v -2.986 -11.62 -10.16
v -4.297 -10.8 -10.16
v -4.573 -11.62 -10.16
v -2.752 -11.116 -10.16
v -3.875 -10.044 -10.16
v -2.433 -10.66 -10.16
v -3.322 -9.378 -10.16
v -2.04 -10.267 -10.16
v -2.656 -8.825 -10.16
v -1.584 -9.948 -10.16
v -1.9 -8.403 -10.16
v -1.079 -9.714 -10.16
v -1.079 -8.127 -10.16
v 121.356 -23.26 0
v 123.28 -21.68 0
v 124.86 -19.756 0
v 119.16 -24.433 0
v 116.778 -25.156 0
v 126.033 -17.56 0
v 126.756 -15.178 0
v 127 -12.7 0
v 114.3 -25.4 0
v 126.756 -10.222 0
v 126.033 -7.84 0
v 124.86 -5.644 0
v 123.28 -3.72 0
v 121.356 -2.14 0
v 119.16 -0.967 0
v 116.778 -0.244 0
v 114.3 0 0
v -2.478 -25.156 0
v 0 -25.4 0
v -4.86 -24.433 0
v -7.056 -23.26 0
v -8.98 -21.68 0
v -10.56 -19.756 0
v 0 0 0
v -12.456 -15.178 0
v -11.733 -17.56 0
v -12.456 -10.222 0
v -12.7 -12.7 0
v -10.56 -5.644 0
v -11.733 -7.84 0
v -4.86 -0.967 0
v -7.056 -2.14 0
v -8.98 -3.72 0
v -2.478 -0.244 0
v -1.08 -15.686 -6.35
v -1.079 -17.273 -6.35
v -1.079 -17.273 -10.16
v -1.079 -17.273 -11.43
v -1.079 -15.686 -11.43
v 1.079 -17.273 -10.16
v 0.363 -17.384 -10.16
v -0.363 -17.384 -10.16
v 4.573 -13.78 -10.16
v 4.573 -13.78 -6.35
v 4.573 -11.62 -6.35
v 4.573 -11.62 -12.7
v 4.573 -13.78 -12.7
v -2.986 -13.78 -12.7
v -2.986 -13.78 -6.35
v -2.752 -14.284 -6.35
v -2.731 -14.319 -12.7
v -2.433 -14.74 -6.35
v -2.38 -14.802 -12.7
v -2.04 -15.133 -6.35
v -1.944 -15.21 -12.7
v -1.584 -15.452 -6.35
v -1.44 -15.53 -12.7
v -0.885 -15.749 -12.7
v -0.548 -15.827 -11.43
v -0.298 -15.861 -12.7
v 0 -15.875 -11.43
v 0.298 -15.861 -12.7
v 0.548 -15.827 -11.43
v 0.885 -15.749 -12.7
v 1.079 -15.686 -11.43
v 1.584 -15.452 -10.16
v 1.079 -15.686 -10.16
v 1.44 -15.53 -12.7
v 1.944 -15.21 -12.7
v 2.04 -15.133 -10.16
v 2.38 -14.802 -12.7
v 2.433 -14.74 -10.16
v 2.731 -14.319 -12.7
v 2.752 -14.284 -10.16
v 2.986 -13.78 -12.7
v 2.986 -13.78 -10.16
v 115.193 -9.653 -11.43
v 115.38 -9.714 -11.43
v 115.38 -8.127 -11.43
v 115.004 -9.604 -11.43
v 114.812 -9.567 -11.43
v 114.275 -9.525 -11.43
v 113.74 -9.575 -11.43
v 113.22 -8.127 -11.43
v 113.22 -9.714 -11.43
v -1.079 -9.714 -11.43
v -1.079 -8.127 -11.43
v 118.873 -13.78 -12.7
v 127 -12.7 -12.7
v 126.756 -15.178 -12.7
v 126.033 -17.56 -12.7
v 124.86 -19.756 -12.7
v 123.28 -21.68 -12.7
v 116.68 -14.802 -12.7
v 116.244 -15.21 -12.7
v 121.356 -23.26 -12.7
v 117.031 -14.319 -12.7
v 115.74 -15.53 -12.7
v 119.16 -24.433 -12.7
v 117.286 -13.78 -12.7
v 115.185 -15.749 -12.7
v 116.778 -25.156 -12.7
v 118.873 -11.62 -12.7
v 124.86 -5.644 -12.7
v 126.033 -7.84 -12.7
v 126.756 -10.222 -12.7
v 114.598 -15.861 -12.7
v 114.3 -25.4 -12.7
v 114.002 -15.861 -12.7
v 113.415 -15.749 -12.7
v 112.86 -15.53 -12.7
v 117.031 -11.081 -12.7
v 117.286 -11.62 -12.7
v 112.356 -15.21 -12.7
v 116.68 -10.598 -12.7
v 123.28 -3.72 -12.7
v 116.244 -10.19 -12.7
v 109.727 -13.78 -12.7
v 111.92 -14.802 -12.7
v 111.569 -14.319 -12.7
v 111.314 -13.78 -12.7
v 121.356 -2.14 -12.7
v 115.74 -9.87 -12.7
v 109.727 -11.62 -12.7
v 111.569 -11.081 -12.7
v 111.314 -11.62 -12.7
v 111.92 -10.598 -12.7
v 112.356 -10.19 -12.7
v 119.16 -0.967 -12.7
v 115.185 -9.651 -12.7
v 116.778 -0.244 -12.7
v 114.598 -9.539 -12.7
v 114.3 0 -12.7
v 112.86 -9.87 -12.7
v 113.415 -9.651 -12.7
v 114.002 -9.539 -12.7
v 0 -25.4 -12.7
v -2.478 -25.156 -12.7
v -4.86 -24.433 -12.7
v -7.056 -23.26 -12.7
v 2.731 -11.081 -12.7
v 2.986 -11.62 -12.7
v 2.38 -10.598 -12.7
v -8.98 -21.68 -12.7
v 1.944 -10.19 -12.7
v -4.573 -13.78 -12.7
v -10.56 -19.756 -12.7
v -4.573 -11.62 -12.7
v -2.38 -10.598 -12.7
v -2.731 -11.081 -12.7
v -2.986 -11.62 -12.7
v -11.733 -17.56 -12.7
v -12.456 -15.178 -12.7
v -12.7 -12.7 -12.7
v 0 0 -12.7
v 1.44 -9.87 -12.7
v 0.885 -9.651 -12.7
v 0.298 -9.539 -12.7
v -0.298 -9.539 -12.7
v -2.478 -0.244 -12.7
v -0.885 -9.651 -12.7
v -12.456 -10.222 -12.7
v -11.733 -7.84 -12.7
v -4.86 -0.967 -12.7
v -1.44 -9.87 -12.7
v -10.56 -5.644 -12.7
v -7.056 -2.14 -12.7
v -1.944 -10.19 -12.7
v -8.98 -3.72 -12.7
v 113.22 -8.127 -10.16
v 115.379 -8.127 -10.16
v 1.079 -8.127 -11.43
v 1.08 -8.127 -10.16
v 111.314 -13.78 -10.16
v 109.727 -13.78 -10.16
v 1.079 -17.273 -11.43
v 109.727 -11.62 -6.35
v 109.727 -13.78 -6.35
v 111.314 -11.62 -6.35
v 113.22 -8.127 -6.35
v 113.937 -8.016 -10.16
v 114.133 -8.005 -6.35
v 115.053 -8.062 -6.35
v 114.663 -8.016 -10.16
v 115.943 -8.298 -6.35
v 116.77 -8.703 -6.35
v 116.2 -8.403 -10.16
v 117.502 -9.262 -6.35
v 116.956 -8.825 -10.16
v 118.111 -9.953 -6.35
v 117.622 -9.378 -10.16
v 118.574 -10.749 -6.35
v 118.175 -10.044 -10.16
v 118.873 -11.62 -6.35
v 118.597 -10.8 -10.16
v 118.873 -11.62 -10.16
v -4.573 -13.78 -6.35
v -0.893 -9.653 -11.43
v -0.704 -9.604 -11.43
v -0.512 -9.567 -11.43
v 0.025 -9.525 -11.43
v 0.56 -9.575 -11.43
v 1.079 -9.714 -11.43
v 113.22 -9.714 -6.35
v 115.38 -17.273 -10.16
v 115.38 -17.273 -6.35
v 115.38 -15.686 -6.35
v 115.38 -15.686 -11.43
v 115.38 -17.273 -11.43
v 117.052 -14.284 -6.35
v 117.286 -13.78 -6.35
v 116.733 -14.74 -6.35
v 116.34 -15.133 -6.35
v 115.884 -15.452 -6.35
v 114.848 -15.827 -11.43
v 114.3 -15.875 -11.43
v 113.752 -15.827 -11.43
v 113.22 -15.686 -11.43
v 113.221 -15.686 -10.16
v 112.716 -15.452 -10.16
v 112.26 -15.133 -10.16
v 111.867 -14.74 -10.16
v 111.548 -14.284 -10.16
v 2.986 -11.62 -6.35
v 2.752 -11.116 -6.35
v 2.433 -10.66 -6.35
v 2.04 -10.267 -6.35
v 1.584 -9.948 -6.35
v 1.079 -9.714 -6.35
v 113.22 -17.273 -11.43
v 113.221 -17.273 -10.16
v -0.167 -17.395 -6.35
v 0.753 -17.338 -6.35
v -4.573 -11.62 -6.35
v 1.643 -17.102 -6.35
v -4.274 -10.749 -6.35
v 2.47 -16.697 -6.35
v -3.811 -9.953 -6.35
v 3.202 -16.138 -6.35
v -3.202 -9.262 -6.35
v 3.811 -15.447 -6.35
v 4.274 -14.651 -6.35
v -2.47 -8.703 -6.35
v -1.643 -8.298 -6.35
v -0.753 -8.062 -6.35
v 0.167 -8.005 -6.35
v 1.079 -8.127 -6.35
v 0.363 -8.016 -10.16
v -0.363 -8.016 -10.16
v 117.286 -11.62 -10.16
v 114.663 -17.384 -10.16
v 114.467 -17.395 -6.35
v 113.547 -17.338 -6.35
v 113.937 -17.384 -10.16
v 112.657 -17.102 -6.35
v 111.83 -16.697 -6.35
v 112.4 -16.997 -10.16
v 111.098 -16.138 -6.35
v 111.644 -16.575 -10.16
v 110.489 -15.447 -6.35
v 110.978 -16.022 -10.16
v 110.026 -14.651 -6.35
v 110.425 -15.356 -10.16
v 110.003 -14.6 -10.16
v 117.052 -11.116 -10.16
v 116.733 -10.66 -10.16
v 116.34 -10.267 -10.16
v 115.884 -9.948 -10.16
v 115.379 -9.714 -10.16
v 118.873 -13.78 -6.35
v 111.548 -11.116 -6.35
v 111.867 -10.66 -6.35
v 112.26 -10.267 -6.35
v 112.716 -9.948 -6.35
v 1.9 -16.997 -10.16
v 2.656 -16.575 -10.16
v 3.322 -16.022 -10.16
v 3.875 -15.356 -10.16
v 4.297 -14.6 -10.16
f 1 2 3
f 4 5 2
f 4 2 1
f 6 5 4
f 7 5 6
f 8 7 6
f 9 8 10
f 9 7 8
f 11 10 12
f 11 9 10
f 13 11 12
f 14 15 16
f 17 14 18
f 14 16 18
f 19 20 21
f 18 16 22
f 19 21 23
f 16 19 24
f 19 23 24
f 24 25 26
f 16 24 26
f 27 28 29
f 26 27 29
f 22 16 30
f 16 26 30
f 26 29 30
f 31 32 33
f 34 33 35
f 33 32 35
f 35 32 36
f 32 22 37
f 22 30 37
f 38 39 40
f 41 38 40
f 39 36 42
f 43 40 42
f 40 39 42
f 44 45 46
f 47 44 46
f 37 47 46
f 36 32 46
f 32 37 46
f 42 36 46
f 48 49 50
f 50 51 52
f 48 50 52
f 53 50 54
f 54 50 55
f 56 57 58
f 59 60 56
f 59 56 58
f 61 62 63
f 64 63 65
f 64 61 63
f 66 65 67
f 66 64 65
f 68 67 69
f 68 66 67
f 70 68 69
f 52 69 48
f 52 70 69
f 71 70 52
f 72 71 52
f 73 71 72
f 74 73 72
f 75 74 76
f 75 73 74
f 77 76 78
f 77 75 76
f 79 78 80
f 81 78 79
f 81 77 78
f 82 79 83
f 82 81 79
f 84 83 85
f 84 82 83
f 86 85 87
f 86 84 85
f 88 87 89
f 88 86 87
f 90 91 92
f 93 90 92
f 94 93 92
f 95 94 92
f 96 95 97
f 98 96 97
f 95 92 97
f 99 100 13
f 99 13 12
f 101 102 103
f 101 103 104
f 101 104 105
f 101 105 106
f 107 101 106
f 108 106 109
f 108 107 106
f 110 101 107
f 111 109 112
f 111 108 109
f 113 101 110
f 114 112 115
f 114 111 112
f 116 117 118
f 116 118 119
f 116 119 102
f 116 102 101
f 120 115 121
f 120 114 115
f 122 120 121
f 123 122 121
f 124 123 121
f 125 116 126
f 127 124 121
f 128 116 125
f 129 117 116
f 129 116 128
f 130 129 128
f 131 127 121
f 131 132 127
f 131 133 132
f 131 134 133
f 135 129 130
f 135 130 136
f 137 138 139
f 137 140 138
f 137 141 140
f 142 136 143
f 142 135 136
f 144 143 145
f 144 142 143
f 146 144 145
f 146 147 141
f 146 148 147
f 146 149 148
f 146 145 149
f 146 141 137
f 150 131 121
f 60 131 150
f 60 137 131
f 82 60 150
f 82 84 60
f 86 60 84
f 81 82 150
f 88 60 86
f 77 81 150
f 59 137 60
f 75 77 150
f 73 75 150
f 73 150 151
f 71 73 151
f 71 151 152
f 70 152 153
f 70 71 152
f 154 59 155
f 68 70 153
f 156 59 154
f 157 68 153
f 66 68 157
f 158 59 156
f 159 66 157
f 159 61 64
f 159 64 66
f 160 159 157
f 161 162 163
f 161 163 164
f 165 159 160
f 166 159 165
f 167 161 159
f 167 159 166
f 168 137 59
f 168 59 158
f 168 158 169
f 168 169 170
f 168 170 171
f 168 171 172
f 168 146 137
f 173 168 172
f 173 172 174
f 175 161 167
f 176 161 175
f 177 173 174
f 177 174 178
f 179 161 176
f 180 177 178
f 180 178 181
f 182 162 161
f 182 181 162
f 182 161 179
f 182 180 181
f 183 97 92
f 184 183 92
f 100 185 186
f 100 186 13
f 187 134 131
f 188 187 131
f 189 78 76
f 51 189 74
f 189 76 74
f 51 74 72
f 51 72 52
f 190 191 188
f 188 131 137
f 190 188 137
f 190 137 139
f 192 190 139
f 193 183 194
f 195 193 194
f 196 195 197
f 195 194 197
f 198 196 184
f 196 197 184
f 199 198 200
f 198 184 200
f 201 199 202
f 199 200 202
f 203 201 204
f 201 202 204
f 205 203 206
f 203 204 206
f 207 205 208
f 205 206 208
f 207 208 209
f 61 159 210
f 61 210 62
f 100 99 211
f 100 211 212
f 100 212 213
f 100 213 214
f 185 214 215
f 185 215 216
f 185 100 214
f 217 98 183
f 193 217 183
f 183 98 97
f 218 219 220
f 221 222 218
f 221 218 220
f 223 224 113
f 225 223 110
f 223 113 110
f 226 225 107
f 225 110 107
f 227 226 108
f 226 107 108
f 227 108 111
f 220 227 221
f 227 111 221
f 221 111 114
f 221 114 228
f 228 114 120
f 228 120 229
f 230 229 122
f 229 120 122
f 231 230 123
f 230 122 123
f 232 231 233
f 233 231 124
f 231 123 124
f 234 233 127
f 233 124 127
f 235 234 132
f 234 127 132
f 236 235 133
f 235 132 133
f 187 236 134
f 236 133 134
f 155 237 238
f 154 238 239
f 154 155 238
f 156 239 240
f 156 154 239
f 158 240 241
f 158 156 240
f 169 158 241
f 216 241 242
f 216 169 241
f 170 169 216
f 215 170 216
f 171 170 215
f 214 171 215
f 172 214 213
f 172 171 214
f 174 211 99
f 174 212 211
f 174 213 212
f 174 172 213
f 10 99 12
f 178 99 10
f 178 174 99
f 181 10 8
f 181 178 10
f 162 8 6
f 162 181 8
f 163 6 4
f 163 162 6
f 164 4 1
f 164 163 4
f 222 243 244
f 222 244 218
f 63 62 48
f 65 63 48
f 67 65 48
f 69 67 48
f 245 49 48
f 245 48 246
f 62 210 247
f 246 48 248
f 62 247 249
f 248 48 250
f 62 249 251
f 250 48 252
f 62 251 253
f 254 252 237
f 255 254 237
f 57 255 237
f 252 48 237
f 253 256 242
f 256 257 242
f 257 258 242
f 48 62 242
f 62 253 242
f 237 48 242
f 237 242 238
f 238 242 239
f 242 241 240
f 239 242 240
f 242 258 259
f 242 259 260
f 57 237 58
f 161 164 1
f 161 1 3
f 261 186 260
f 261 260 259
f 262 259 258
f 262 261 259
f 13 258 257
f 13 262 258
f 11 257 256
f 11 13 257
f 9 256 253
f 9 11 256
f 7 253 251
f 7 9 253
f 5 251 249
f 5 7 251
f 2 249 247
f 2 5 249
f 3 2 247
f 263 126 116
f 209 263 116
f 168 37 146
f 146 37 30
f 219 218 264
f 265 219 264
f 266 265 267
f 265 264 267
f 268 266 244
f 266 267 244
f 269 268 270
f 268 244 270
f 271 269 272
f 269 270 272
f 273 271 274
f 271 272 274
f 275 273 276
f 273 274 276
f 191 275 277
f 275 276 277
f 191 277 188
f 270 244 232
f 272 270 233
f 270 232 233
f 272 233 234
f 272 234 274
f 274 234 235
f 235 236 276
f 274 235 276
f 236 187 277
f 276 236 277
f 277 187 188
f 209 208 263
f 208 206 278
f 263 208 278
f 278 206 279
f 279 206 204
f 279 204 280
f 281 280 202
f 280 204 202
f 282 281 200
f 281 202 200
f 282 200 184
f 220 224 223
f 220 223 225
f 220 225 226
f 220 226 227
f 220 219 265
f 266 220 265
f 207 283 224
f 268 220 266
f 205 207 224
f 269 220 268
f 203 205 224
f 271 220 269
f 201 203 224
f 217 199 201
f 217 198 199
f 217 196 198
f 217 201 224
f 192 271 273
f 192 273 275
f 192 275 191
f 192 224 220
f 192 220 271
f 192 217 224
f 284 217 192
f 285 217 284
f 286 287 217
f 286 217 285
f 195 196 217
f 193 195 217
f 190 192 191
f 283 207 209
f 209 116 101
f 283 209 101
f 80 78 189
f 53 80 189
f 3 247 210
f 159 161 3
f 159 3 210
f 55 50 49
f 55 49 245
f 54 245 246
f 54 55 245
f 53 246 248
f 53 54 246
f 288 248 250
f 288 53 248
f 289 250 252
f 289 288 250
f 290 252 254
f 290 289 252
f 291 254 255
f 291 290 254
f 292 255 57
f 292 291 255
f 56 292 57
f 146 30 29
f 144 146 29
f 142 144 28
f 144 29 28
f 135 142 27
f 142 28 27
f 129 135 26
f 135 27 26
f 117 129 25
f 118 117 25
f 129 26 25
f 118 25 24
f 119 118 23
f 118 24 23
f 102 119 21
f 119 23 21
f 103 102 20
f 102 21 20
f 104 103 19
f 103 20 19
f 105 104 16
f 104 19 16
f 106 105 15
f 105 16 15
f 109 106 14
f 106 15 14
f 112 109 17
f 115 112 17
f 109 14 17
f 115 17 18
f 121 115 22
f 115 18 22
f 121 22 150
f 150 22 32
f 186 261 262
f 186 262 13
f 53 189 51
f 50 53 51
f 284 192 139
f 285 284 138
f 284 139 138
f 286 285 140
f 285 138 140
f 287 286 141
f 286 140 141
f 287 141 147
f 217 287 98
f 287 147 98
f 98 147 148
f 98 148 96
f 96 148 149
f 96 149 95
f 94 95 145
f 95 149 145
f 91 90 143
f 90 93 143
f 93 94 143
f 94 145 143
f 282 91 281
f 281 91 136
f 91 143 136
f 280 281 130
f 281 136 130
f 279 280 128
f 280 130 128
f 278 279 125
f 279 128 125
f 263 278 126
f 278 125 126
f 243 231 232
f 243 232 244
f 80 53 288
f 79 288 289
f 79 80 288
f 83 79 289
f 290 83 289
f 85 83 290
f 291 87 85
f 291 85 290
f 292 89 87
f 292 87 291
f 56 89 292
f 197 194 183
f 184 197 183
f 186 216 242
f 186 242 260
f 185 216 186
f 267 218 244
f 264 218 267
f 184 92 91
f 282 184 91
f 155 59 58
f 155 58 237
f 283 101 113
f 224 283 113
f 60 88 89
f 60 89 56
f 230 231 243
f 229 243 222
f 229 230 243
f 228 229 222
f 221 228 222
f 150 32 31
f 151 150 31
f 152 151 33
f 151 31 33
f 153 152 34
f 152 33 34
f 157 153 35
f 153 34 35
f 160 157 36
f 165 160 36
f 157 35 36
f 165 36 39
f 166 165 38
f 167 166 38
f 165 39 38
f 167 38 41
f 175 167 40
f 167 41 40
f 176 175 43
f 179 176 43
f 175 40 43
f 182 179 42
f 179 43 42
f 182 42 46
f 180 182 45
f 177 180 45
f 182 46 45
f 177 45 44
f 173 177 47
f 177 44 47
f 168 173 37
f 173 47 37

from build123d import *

# Parameters (mm, degrees)
BOSS_EXTRUDE1_DEPTH = 12.7
CUT_EXTRUDE1_DEPTH  = 6.35
CUT_EXTRUDE4_START  = 3.81
CUT_EXTRUDE4_DEPTH  = 3.81
CUT_EXTRUDE5_START  = 5.08
CUT_EXTRUDE5_DEPTH  = 5.08


with BuildPart() as part:
    # Sketch1 → Boss-Extrude1 (new body)
    with BuildSketch(Plane.XY):
        with BuildLine():
            Line((0, 0), (114.3, 0))
            ThreePointArc((114.3, 0), (127, -12.7), (114.3, -25.4))
            Line((114.3, -25.4), (0, -25.4))
            ThreePointArc((0, -25.4), (-12.7, -12.7), (0, 0))
        make_face()
    extrude(amount=-BOSS_EXTRUDE1_DEPTH)

    # Sketch2 → Cut-Extrude1 (cut)
    with BuildSketch(Plane(origin=(0, 0, -12.7), x_dir=(-1, 0, 0), z_dir=(0, 0, -1))):
        with BuildLine():
            Line((-118.872586333, -11.6205), (-118.872586333, -13.7795))
            Line((-118.872586333, -13.7795), (-117.285850758, -13.7795))
            ThreePointArc((-117.285850758, -13.7795), (-114.3, -15.875), (-111.314149242, -13.7795))
            Line((-111.314149242, -13.7795), (-109.727413667, -13.7795))
            Line((-109.727413667, -13.7795), (-109.727413667, -11.6205))
            Line((-109.727413667, -11.6205), (-111.314149242, -11.6205))
            ThreePointArc((-111.314149242, -11.6205), (-114.3, -9.525), (-117.285850758, -11.6205))
            Line((-117.285850758, -11.6205), (-118.872586333, -11.6205))
        make_face()
        with BuildLine():
            Line((-4.572586333, -11.6205), (-2.985850758, -11.6205))
            ThreePointArc((-2.985850758, -11.6205), (0, -9.525), (2.985850758, -11.6205))
            Line((2.985850758, -11.6205), (4.572586333, -11.6205))
            Line((4.572586333, -11.6205), (4.572586333, -13.7795))
            Line((4.572586333, -13.7795), (2.985850758, -13.7795))
            ThreePointArc((2.985850758, -13.7795), (0, -15.875), (-2.985850758, -13.7795))
            Line((-2.985850758, -13.7795), (-4.572586333, -13.7795))
            Line((-4.572586333, -13.7795), (-4.572586333, -11.6205))
        make_face()
    extrude(amount=-CUT_EXTRUDE1_DEPTH, mode=Mode.SUBTRACT)

    # Sketch3 → Cut-Extrude4 (cut)
    with BuildSketch(Plane(origin=(0, 0, -6.35), x_dir=(-1, 0, 0), z_dir=(0, 0, -1)).offset(CUT_EXTRUDE4_START)):
        with BuildLine():
            ThreePointArc((-113.2205, -8.127413667), (-116.769985033, -8.703371426), (-118.872586333, -11.6205))
            Line((-118.872586333, -11.6205), (-117.285850758, -11.6205))
            ThreePointArc((-117.285850758, -11.6205), (-115.647993548, -9.825362911), (-113.2205, -9.714149242))
            Line((-113.2205, -9.714149242), (-113.2205, -8.127413667))
        make_face()
        with BuildLine():
            Line((-109.727413667, -13.7795), (-111.314149242, -13.7795))
            ThreePointArc((-111.314149242, -13.7795), (-112.952006452, -15.574637089), (-115.3795, -15.685850758))
            Line((-115.3795, -15.685850758), (-115.3795, -17.272586333))
            ThreePointArc((-115.3795, -17.272586333), (-111.830014967, -16.696628574), (-109.727413667, -13.7795))
        make_face()
        with BuildLine():
            ThreePointArc((-1.0795, -8.127413667), (2.469985033, -8.703371426), (4.572586333, -11.6205))
            Line((4.572586333, -11.6205), (2.985850758, -11.6205))
            ThreePointArc((2.985850758, -11.6205), (1.347993548, -9.825362911), (-1.0795, -9.714149242))
            Line((-1.0795, -9.714149242), (-1.0795, -8.127413667))
        make_face()
        with BuildLine():
            ThreePointArc((1.0795, -17.272586333), (-2.469985033, -16.696628574), (-4.572586333, -13.7795))
            Line((-4.572586333, -13.7795), (-2.985850758, -13.7795))
            ThreePointArc((-2.985850758, -13.7795), (-1.347993548, -15.574637089), (1.0795, -15.685850758))
            Line((1.0795, -15.685850758), (1.0795, -17.272586333))
        make_face()
    extrude(amount=-CUT_EXTRUDE4_DEPTH, mode=Mode.SUBTRACT)

    # Sketch4 → Cut-Extrude5 (cut)
    with BuildSketch(Plane(origin=(0, 0, -6.35), x_dir=(-1, 0, 0), z_dir=(0, 0, -1)).offset(CUT_EXTRUDE5_START)):
        with BuildLine():
            Line((-113.2205, -9.714149242), (-113.2205, -8.127413667))
            Line((-113.2205, -8.127413667), (-115.3795, -8.127413667))
            Line((-115.3795, -8.127413667), (-115.3795, -9.714149242))
            ThreePointArc((-115.3795, -9.714149242), (-115.099019405, -9.627184843), (-114.8117038, -9.566506068))
            ThreePointArc((-114.8117038, -9.566506068), (-114.006661019, -9.538579869), (-113.2205, -9.714149242))
        make_face()
        with BuildLine():
            ThreePointArc((-115.3795, -15.685850758), (-114.3, -15.875), (-113.2205, -15.685850758))
            Line((-113.2205, -15.685850758), (-113.2205, -17.272586333))
            Line((-113.2205, -17.272586333), (-115.3795, -17.272586333))
            Line((-115.3795, -17.272586333), (-115.3795, -15.685850758))
        make_face()
    cut_extrude5 = extrude(amount=-CUT_EXTRUDE5_DEPTH, mode=Mode.SUBTRACT)

    # Mirror2: Cut-Extrude5 across plane
    add(cut_extrude5.mirror(Plane(origin=(57.15, 0, 0), x_dir=(0, 0, 1), z_dir=(1, 0, 0))), mode=Mode.SUBTRACT)


solid = part.part
